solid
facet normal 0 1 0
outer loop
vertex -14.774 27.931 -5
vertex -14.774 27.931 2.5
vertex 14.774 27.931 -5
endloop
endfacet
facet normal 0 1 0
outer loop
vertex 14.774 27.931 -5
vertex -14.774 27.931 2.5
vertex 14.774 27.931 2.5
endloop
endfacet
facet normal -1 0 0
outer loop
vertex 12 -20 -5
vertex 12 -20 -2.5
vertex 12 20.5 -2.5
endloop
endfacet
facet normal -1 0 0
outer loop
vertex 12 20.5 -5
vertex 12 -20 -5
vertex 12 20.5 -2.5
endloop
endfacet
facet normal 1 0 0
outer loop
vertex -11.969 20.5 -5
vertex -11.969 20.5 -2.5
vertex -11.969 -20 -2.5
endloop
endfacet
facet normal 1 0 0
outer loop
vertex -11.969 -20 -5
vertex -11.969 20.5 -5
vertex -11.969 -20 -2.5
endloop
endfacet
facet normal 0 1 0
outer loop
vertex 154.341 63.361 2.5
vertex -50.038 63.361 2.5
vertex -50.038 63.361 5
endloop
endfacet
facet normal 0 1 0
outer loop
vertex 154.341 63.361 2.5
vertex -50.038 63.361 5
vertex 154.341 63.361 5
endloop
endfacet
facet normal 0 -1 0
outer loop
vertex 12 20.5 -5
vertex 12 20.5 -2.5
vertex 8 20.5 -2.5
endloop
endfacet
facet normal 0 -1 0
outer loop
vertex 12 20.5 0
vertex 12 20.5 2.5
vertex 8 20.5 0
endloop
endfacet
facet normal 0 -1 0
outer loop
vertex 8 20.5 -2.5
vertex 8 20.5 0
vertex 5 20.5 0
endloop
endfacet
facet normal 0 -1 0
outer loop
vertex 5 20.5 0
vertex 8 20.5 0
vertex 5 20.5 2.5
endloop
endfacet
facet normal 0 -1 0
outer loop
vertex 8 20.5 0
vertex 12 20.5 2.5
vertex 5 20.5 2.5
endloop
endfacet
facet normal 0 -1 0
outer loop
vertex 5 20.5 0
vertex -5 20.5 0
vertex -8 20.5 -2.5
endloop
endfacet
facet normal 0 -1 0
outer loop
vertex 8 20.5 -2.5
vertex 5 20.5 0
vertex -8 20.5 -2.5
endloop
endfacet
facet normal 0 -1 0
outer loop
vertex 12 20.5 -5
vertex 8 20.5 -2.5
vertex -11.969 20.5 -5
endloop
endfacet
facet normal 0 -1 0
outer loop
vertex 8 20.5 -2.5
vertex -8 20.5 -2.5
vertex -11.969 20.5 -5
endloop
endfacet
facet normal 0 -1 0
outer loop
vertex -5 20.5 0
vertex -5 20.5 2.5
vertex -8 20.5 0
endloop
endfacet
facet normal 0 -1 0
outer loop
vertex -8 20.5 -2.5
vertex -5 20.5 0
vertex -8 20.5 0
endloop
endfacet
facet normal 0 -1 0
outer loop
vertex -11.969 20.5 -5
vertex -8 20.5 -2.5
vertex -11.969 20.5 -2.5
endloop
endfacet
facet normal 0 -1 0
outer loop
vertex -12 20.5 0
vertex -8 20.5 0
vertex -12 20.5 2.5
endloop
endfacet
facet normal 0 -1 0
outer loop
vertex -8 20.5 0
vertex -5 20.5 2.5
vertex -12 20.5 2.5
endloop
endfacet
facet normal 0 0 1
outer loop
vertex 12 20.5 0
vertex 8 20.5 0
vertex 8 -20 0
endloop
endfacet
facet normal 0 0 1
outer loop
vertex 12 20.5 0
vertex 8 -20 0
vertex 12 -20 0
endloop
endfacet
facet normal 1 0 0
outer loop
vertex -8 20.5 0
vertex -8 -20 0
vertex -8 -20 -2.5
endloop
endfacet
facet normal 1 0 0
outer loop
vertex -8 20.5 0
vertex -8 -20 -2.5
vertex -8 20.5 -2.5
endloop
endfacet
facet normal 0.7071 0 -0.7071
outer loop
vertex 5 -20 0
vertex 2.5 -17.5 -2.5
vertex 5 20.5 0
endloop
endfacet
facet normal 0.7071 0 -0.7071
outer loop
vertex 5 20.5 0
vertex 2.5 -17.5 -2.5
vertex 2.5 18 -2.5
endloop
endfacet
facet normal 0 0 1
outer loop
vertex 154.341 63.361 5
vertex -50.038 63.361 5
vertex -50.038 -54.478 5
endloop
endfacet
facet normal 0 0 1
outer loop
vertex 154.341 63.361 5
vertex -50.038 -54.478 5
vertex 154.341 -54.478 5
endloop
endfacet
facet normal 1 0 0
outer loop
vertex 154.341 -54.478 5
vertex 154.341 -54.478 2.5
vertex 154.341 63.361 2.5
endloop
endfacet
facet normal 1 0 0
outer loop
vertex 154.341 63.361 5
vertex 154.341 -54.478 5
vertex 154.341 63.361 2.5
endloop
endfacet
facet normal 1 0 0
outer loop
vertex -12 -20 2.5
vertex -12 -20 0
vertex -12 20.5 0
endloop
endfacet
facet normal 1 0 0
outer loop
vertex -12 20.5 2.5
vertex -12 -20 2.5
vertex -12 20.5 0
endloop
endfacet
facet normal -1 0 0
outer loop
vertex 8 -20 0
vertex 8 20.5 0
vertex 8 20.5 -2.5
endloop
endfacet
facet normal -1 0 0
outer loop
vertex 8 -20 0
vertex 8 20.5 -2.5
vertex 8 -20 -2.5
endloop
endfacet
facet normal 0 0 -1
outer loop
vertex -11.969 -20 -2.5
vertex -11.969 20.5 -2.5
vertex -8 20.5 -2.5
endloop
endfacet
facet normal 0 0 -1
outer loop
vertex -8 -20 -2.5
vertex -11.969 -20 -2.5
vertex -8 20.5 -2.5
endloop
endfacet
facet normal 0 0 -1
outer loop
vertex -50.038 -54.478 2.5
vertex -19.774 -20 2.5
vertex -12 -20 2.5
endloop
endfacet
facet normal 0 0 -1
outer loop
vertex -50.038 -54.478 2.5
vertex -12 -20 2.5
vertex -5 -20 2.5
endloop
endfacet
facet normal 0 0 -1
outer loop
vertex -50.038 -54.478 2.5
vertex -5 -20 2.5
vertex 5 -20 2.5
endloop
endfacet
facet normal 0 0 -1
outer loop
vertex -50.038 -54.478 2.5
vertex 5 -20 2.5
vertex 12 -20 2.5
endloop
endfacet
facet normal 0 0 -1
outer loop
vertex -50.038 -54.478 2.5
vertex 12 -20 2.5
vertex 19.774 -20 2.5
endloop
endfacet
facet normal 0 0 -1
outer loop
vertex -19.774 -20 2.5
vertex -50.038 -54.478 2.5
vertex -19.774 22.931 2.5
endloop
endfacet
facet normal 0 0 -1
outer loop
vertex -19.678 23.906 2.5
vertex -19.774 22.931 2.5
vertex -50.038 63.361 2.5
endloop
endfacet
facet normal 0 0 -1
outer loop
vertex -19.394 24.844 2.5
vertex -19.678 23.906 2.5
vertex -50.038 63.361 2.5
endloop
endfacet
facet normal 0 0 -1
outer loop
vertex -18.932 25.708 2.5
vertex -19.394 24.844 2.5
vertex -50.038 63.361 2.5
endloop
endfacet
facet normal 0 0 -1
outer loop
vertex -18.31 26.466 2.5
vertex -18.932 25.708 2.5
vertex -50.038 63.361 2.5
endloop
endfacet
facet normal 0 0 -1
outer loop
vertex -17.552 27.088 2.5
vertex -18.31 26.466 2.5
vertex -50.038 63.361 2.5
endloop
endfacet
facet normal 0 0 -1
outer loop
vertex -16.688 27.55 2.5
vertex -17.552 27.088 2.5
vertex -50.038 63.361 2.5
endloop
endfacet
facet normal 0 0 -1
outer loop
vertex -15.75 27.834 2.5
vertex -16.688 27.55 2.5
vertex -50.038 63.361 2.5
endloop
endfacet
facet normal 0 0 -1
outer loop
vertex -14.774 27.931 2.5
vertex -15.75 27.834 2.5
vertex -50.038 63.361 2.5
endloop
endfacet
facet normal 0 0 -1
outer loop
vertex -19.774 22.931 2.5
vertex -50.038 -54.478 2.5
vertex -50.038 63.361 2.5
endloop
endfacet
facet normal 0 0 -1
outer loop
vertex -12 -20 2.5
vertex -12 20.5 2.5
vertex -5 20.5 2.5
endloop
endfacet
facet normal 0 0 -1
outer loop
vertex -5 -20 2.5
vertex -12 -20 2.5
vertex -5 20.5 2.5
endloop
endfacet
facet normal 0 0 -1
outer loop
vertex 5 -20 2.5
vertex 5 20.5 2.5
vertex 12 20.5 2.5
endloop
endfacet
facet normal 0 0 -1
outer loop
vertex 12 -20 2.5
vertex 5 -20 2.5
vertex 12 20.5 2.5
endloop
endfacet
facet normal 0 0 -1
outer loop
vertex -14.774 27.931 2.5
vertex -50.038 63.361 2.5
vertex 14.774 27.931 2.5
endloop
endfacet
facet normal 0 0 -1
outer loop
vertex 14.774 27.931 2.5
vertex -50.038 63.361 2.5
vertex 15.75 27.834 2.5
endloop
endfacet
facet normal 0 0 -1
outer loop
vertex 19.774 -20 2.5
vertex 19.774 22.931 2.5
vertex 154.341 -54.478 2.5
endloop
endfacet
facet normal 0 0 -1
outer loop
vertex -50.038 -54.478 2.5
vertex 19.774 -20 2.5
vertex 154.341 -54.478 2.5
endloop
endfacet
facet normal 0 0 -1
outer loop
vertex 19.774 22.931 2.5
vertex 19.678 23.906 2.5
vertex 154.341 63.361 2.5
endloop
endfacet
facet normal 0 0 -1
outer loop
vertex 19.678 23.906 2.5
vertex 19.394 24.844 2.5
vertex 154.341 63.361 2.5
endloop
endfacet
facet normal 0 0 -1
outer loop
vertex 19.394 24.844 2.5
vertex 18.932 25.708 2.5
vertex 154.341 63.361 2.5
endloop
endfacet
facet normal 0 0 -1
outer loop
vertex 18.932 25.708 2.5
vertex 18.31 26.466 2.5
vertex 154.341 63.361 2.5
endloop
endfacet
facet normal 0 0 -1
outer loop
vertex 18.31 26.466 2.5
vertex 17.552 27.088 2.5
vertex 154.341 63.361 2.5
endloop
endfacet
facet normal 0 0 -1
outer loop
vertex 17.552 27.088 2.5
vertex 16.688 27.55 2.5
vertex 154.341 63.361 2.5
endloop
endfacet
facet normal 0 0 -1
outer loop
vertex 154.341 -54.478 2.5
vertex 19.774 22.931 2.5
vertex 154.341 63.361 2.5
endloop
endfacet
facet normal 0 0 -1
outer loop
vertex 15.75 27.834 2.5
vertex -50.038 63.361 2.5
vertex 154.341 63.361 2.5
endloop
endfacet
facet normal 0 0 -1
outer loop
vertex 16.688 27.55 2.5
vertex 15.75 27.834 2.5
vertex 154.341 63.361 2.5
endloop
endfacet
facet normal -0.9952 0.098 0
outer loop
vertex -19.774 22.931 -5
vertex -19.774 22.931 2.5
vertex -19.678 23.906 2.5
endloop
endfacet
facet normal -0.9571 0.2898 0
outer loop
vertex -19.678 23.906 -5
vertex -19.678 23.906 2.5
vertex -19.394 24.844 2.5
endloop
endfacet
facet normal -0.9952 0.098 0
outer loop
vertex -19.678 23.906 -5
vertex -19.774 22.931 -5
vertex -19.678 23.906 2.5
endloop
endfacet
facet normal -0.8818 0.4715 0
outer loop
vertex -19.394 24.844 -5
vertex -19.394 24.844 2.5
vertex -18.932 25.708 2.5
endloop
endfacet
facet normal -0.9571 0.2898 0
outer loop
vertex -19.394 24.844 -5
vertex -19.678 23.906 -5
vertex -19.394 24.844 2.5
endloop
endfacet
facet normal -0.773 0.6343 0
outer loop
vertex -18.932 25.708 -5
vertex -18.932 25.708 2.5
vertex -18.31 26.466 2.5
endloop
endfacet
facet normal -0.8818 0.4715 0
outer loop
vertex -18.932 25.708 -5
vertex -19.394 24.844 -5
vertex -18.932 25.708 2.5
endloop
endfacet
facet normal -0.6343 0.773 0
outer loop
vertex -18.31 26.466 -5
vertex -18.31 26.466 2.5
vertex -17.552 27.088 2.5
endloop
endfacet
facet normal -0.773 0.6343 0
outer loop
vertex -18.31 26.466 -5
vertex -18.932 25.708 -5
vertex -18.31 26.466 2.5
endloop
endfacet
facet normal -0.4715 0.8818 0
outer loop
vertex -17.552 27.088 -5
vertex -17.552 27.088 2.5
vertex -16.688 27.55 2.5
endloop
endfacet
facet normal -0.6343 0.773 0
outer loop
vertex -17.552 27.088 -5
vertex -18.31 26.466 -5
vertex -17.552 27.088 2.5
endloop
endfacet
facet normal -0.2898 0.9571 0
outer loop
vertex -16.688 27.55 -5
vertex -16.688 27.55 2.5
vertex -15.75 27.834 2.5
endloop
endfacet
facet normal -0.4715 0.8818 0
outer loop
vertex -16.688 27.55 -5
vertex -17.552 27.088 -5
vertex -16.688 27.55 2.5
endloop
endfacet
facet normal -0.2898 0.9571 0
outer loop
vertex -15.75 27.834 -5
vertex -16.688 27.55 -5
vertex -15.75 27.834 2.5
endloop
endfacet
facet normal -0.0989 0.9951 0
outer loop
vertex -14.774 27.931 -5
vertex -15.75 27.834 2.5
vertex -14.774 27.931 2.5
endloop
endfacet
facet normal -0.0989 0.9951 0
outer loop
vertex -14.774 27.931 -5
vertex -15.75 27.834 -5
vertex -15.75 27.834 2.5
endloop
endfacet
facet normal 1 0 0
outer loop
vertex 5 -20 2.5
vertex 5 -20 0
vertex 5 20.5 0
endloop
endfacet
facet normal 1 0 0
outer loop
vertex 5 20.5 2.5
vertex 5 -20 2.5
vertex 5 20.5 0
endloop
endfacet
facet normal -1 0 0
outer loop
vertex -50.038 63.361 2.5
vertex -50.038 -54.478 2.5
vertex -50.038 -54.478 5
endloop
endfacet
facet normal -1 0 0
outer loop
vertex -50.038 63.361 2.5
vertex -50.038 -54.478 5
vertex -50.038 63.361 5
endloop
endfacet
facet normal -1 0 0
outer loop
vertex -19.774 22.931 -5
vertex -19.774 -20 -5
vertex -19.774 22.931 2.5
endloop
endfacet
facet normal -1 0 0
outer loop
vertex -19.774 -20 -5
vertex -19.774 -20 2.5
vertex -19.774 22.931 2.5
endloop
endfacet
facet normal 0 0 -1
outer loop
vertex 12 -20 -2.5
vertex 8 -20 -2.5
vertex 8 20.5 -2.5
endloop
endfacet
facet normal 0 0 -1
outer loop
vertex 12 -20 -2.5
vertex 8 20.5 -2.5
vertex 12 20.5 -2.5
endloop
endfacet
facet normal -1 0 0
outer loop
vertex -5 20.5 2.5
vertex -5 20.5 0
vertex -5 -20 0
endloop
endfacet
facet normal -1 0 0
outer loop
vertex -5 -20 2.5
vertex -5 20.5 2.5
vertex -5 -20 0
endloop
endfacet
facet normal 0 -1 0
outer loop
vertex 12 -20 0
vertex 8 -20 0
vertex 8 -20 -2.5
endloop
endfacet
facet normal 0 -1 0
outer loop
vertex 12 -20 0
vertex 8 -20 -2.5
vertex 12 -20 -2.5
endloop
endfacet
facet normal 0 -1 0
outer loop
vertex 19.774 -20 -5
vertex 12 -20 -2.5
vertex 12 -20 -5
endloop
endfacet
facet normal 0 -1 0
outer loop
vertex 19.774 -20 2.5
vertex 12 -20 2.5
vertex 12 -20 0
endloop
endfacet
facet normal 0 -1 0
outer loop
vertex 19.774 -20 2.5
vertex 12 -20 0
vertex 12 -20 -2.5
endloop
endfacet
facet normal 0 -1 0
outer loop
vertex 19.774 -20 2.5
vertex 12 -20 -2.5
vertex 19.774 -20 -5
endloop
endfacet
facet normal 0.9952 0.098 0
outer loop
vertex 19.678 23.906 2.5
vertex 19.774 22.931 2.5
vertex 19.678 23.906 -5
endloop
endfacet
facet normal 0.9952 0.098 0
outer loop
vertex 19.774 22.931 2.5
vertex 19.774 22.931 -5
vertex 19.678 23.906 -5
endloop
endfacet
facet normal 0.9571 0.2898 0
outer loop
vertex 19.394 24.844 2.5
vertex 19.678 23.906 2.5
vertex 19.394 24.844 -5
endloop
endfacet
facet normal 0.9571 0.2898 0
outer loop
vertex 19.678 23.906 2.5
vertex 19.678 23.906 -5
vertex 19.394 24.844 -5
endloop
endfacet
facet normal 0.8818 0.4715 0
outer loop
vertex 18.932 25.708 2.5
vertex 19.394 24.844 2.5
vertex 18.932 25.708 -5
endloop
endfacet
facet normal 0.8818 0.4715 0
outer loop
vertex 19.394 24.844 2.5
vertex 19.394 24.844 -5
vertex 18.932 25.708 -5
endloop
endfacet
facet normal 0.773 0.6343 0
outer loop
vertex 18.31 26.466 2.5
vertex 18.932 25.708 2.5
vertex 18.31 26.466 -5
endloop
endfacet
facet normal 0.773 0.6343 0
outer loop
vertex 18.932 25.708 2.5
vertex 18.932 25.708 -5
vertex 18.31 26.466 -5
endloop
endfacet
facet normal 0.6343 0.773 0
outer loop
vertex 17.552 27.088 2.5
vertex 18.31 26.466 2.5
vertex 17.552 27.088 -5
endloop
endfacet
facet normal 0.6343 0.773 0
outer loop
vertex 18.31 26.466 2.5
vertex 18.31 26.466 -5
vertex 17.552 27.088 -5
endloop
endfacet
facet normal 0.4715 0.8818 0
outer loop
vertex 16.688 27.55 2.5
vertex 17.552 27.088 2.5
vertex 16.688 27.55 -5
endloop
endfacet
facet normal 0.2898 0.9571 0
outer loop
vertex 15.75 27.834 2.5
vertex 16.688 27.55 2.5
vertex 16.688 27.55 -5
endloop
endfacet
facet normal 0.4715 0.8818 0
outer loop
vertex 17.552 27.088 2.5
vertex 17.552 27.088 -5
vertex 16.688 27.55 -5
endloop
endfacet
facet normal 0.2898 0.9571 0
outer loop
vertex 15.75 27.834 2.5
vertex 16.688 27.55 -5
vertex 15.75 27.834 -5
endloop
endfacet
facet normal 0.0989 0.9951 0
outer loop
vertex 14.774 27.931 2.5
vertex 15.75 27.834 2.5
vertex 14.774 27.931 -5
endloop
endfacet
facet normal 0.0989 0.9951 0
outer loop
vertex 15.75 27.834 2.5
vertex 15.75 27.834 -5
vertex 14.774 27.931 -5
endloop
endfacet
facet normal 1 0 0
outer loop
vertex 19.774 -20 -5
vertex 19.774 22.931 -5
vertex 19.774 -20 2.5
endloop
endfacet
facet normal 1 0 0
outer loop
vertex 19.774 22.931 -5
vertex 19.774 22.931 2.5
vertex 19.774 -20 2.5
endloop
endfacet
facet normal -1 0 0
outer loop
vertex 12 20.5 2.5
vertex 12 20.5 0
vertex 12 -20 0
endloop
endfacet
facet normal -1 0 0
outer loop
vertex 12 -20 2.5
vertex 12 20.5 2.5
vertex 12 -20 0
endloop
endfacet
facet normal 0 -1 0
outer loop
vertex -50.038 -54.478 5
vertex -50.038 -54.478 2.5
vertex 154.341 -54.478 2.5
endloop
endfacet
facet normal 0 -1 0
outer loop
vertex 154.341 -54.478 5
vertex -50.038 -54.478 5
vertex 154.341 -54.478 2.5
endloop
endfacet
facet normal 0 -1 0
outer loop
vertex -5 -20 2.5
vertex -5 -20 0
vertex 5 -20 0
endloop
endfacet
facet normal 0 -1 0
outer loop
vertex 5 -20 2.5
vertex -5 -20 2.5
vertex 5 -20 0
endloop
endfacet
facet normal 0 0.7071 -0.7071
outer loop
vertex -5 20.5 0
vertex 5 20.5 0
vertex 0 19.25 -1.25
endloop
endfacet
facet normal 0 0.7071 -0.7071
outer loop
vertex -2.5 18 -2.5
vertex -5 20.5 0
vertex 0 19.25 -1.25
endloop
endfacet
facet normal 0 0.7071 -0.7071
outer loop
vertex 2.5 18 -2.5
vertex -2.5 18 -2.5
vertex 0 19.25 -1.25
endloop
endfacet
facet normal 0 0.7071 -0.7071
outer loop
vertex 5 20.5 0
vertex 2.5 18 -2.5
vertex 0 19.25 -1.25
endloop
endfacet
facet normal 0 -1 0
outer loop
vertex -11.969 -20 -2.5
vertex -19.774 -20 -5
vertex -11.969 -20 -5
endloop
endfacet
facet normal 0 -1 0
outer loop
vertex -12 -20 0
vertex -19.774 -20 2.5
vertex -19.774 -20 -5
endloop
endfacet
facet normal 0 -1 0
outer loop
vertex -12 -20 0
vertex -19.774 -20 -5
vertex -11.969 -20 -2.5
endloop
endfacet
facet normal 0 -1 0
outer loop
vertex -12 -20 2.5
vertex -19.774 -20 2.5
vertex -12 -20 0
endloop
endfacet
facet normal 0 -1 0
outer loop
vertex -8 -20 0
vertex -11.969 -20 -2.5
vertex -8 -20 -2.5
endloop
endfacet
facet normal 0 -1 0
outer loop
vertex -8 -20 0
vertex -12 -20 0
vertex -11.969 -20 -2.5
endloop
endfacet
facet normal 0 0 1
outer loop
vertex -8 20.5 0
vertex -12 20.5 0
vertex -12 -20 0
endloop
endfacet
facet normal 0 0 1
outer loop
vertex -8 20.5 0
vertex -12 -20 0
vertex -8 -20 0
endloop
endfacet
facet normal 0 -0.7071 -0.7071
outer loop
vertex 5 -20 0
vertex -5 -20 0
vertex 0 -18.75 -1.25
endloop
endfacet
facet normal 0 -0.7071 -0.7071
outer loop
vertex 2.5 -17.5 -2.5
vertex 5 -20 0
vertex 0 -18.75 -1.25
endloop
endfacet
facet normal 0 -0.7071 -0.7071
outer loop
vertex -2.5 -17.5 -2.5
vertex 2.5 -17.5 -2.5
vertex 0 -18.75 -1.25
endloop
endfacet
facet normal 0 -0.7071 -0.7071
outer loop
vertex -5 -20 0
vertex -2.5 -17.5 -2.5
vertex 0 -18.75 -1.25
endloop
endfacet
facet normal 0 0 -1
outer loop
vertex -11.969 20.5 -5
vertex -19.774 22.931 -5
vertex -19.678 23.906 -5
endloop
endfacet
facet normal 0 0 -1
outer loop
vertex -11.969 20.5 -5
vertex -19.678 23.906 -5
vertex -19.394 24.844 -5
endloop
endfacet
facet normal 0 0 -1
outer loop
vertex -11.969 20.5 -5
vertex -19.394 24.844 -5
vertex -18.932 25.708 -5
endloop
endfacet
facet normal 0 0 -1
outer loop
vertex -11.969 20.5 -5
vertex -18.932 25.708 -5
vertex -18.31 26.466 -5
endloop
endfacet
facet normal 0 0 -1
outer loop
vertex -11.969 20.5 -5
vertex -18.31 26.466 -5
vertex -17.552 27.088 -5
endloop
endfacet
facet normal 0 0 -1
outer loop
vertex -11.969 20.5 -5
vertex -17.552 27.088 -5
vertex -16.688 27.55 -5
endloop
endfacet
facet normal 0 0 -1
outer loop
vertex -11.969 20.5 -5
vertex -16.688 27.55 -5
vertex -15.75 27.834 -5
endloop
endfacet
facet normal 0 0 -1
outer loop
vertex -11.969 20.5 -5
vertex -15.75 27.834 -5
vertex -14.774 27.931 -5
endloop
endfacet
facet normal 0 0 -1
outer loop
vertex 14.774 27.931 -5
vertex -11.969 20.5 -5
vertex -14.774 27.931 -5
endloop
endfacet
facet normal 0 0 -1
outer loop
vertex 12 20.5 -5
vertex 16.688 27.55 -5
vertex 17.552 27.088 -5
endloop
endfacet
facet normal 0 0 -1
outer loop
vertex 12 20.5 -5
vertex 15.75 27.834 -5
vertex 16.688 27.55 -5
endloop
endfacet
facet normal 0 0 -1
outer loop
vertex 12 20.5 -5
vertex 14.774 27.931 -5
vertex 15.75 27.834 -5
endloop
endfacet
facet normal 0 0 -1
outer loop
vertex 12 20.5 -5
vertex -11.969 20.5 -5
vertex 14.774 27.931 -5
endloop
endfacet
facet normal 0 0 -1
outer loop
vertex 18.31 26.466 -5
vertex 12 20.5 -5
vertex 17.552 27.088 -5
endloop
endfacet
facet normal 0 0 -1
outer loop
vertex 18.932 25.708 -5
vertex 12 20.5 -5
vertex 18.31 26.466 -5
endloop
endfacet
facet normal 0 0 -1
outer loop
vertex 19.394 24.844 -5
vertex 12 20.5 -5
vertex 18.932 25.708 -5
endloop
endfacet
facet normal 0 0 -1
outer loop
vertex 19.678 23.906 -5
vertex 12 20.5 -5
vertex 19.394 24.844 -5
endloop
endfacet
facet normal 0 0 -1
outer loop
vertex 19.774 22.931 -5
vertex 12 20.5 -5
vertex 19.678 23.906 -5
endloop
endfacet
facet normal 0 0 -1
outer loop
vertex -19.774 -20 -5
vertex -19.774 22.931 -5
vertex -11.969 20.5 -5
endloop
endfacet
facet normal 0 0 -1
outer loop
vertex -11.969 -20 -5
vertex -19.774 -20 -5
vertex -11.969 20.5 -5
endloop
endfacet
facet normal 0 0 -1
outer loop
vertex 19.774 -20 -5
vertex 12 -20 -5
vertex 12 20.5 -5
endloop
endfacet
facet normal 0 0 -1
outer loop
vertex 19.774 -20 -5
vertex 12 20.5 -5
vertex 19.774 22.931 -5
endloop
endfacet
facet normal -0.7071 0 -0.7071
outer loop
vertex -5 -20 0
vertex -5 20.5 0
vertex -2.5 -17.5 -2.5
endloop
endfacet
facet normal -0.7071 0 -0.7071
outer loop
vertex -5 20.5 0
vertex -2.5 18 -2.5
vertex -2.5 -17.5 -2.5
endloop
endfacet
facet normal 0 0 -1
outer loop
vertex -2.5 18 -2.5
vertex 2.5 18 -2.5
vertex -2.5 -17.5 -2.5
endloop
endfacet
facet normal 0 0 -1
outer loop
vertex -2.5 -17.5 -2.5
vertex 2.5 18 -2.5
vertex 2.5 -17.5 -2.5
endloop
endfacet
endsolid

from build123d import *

# Parameters (mm, degrees)
F2_DEPTH = 2.5
F3_DEPTH = 2.5
F4_DEPTH = 2.5
F4_TAPER = 45
F5_W     = 7.8047607094
F5_H     = 40.5
F5_H_2   = 7.430572629
F5_W_2   = 7.7738855034
F6_DEPTH = 2.5
F7_R     = 5
F8_W     = 204.3793946505
F8_H     = 117.8380995989
F9_DEPTH = 2.5


with BuildPart() as f2:
    # F1 (on Top) → F2 (new body)
    with BuildSketch(Plane.XY):
        Polygon((-12, 12.7071067812), (-12, 16), (-12, 20.5), (-8, 20.5), (-5, 20.5), (5, 20.5), (8, 20.5), (12, 20.5), (12, -20), (19.7742227465, -20), (19.7742227465, 27.930572629), (-19.7742227465, 27.930572629), (-19.7742227465, -20), (-12, -20), align=None)
        Polygon((5, 20.5), (-5, 20.5), (-5, -20), (5, -20), (5, 12.7071067812), (5, 16), align=None)
    extrude(amount=F2_DEPTH)

    # F1 (on Top) → F3 (join)
    with BuildSketch(Plane.XY):
        Polygon((12, 20.5), (8, 20.5), (8, 16), (8.2928932188, 16), (8, 15.7071067812), (8, -20), (12, -20), align=None)
        Polygon((-12, 12.7071067812), (-12, 16), (-12, 20.5), (-8, 20.5), (-5, 20.5), (5, 20.5), (8, 20.5), (12, 20.5), (12, -20), (19.7742227465, -20), (19.7742227465, 27.930572629), (-19.7742227465, 27.930572629), (-19.7742227465, -20), (-12, -20), align=None)
        Polygon((8.2928932188, 16), (8, 16), (8, 15.7071067812), align=None)
        Polygon((-12, 20.5), (-12, 16), (-8.7071067812, 16), (-12, 12.7071067812), (-12, -20), (-8, -20), (-8, 20.5), align=None)
        Polygon((-8.7071067812, 16), (-12, 16), (-12, 12.7071067812), align=None)
    extrude(amount=-F3_DEPTH)

    # F1 (on Top) → F4 (join)
    with BuildSketch(Plane.XY):
        Polygon((5, 20.5), (-5, 20.5), (-5, -20), (5, -20), (5, 12.7071067812), (5, 16), align=None)
    extrude(amount=-F4_DEPTH, taper=F4_TAPER)

    # F5 (on face) → F6 (join)
    with BuildSketch(Plane(origin=(0, 0, -2.5), x_dir=(1, 0, 0), z_dir=(0, 0, -1))):
        with Locations((-15.8718423918, -0.25)):
            Rectangle(F5_W, F5_H)
        with Locations((-15.8718423918, -24.2152863145)):
            Rectangle(F5_W, F5_H_2)
        with Locations((15.8872799948, -0.25)):
            Rectangle(F5_W_2, F5_H)
        with Locations((15.8872799948, -24.2152863145)):
            Rectangle(F5_W_2, F5_H_2)
        Polygon((-8, -20.5), (-11.9694620371, -20.5), (-11.9694620371, -27.930572629), (12.0003372431, -27.930572629), (12.0003372431, -20.5), (8, -20.5), align=None)
    extrude(amount=F6_DEPTH)

    # F7
    f7_edges = [f2.edges().sort_by_distance(p)[0] for p in [
        (-19.774223, 27.930573, -1.25),
        (19.774223, 27.930573, -1.25),
    ]]
    fillet(f7_edges, radius=F7_R)

    # F8 (on face) → F9 (join)
    with BuildSketch(Plane.XY.offset(2.5)):
        with Locations((52.1517619491, 4.441536963)):
            Rectangle(F8_W, F8_H)
        with BuildLine():
            Line((19.7742227465, 22.930572629), (19.7742227465, -20))
            Line((19.7742227465, -20), (12, -20))
            Line((12, -20), (12, 20.5))
            Line((12, 20.5), (5, 20.5))
            Line((5, 20.5), (5, -20))
            Line((5, -20), (-5, -20))
            Line((-5, -20), (-5, 20.5))
            Line((-5, 20.5), (-12, 20.5))
            Line((-12, 20.5), (-12, -20))
            Line((-12, -20), (-19.7742227465, -20))
            Line((-19.7742227465, -20), (-19.7742227465, 22.930572629))
            ThreePointArc((-19.7742227465, 22.930572629), (-18.3097566524, 26.4661065349), (-14.7742227465, 27.930572629))
            Line((-14.7742227465, 27.930572629), (14.7742227465, 27.930572629))
            ThreePointArc((14.7742227465, 27.930572629), (18.3097566524, 26.4661065349), (19.7742227465, 22.930572629))
        make_face(mode=Mode.SUBTRACT)
        with BuildLine():
            Line((12, -20), (19.7742227465, -20))
            Line((19.7742227465, -20), (19.7742227465, 22.930572629))
            ThreePointArc((19.7742227465, 22.930572629), (18.3097566524, 26.4661065349), (14.7742227465, 27.930572629))
            Line((14.7742227465, 27.930572629), (-14.7742227465, 27.930572629))
            ThreePointArc((-14.7742227465, 27.930572629), (-18.3097566524, 26.4661065349), (-19.7742227465, 22.930572629))
            Line((-19.7742227465, 22.930572629), (-19.7742227465, -20))
            Line((-19.7742227465, -20), (-12, -20))
            Line((-12, -20), (-12, 20.5))
            Line((-12, 20.5), (-5, 20.5))
            Line((-5, 20.5), (-5, -20))
            Line((-5, -20), (5, -20))
            Line((5, -20), (5, 20.5))
            Line((5, 20.5), (12, 20.5))
            Line((12, 20.5), (12, -20))
        make_face()
    extrude(amount=F9_DEPTH)


solid = f2.part
